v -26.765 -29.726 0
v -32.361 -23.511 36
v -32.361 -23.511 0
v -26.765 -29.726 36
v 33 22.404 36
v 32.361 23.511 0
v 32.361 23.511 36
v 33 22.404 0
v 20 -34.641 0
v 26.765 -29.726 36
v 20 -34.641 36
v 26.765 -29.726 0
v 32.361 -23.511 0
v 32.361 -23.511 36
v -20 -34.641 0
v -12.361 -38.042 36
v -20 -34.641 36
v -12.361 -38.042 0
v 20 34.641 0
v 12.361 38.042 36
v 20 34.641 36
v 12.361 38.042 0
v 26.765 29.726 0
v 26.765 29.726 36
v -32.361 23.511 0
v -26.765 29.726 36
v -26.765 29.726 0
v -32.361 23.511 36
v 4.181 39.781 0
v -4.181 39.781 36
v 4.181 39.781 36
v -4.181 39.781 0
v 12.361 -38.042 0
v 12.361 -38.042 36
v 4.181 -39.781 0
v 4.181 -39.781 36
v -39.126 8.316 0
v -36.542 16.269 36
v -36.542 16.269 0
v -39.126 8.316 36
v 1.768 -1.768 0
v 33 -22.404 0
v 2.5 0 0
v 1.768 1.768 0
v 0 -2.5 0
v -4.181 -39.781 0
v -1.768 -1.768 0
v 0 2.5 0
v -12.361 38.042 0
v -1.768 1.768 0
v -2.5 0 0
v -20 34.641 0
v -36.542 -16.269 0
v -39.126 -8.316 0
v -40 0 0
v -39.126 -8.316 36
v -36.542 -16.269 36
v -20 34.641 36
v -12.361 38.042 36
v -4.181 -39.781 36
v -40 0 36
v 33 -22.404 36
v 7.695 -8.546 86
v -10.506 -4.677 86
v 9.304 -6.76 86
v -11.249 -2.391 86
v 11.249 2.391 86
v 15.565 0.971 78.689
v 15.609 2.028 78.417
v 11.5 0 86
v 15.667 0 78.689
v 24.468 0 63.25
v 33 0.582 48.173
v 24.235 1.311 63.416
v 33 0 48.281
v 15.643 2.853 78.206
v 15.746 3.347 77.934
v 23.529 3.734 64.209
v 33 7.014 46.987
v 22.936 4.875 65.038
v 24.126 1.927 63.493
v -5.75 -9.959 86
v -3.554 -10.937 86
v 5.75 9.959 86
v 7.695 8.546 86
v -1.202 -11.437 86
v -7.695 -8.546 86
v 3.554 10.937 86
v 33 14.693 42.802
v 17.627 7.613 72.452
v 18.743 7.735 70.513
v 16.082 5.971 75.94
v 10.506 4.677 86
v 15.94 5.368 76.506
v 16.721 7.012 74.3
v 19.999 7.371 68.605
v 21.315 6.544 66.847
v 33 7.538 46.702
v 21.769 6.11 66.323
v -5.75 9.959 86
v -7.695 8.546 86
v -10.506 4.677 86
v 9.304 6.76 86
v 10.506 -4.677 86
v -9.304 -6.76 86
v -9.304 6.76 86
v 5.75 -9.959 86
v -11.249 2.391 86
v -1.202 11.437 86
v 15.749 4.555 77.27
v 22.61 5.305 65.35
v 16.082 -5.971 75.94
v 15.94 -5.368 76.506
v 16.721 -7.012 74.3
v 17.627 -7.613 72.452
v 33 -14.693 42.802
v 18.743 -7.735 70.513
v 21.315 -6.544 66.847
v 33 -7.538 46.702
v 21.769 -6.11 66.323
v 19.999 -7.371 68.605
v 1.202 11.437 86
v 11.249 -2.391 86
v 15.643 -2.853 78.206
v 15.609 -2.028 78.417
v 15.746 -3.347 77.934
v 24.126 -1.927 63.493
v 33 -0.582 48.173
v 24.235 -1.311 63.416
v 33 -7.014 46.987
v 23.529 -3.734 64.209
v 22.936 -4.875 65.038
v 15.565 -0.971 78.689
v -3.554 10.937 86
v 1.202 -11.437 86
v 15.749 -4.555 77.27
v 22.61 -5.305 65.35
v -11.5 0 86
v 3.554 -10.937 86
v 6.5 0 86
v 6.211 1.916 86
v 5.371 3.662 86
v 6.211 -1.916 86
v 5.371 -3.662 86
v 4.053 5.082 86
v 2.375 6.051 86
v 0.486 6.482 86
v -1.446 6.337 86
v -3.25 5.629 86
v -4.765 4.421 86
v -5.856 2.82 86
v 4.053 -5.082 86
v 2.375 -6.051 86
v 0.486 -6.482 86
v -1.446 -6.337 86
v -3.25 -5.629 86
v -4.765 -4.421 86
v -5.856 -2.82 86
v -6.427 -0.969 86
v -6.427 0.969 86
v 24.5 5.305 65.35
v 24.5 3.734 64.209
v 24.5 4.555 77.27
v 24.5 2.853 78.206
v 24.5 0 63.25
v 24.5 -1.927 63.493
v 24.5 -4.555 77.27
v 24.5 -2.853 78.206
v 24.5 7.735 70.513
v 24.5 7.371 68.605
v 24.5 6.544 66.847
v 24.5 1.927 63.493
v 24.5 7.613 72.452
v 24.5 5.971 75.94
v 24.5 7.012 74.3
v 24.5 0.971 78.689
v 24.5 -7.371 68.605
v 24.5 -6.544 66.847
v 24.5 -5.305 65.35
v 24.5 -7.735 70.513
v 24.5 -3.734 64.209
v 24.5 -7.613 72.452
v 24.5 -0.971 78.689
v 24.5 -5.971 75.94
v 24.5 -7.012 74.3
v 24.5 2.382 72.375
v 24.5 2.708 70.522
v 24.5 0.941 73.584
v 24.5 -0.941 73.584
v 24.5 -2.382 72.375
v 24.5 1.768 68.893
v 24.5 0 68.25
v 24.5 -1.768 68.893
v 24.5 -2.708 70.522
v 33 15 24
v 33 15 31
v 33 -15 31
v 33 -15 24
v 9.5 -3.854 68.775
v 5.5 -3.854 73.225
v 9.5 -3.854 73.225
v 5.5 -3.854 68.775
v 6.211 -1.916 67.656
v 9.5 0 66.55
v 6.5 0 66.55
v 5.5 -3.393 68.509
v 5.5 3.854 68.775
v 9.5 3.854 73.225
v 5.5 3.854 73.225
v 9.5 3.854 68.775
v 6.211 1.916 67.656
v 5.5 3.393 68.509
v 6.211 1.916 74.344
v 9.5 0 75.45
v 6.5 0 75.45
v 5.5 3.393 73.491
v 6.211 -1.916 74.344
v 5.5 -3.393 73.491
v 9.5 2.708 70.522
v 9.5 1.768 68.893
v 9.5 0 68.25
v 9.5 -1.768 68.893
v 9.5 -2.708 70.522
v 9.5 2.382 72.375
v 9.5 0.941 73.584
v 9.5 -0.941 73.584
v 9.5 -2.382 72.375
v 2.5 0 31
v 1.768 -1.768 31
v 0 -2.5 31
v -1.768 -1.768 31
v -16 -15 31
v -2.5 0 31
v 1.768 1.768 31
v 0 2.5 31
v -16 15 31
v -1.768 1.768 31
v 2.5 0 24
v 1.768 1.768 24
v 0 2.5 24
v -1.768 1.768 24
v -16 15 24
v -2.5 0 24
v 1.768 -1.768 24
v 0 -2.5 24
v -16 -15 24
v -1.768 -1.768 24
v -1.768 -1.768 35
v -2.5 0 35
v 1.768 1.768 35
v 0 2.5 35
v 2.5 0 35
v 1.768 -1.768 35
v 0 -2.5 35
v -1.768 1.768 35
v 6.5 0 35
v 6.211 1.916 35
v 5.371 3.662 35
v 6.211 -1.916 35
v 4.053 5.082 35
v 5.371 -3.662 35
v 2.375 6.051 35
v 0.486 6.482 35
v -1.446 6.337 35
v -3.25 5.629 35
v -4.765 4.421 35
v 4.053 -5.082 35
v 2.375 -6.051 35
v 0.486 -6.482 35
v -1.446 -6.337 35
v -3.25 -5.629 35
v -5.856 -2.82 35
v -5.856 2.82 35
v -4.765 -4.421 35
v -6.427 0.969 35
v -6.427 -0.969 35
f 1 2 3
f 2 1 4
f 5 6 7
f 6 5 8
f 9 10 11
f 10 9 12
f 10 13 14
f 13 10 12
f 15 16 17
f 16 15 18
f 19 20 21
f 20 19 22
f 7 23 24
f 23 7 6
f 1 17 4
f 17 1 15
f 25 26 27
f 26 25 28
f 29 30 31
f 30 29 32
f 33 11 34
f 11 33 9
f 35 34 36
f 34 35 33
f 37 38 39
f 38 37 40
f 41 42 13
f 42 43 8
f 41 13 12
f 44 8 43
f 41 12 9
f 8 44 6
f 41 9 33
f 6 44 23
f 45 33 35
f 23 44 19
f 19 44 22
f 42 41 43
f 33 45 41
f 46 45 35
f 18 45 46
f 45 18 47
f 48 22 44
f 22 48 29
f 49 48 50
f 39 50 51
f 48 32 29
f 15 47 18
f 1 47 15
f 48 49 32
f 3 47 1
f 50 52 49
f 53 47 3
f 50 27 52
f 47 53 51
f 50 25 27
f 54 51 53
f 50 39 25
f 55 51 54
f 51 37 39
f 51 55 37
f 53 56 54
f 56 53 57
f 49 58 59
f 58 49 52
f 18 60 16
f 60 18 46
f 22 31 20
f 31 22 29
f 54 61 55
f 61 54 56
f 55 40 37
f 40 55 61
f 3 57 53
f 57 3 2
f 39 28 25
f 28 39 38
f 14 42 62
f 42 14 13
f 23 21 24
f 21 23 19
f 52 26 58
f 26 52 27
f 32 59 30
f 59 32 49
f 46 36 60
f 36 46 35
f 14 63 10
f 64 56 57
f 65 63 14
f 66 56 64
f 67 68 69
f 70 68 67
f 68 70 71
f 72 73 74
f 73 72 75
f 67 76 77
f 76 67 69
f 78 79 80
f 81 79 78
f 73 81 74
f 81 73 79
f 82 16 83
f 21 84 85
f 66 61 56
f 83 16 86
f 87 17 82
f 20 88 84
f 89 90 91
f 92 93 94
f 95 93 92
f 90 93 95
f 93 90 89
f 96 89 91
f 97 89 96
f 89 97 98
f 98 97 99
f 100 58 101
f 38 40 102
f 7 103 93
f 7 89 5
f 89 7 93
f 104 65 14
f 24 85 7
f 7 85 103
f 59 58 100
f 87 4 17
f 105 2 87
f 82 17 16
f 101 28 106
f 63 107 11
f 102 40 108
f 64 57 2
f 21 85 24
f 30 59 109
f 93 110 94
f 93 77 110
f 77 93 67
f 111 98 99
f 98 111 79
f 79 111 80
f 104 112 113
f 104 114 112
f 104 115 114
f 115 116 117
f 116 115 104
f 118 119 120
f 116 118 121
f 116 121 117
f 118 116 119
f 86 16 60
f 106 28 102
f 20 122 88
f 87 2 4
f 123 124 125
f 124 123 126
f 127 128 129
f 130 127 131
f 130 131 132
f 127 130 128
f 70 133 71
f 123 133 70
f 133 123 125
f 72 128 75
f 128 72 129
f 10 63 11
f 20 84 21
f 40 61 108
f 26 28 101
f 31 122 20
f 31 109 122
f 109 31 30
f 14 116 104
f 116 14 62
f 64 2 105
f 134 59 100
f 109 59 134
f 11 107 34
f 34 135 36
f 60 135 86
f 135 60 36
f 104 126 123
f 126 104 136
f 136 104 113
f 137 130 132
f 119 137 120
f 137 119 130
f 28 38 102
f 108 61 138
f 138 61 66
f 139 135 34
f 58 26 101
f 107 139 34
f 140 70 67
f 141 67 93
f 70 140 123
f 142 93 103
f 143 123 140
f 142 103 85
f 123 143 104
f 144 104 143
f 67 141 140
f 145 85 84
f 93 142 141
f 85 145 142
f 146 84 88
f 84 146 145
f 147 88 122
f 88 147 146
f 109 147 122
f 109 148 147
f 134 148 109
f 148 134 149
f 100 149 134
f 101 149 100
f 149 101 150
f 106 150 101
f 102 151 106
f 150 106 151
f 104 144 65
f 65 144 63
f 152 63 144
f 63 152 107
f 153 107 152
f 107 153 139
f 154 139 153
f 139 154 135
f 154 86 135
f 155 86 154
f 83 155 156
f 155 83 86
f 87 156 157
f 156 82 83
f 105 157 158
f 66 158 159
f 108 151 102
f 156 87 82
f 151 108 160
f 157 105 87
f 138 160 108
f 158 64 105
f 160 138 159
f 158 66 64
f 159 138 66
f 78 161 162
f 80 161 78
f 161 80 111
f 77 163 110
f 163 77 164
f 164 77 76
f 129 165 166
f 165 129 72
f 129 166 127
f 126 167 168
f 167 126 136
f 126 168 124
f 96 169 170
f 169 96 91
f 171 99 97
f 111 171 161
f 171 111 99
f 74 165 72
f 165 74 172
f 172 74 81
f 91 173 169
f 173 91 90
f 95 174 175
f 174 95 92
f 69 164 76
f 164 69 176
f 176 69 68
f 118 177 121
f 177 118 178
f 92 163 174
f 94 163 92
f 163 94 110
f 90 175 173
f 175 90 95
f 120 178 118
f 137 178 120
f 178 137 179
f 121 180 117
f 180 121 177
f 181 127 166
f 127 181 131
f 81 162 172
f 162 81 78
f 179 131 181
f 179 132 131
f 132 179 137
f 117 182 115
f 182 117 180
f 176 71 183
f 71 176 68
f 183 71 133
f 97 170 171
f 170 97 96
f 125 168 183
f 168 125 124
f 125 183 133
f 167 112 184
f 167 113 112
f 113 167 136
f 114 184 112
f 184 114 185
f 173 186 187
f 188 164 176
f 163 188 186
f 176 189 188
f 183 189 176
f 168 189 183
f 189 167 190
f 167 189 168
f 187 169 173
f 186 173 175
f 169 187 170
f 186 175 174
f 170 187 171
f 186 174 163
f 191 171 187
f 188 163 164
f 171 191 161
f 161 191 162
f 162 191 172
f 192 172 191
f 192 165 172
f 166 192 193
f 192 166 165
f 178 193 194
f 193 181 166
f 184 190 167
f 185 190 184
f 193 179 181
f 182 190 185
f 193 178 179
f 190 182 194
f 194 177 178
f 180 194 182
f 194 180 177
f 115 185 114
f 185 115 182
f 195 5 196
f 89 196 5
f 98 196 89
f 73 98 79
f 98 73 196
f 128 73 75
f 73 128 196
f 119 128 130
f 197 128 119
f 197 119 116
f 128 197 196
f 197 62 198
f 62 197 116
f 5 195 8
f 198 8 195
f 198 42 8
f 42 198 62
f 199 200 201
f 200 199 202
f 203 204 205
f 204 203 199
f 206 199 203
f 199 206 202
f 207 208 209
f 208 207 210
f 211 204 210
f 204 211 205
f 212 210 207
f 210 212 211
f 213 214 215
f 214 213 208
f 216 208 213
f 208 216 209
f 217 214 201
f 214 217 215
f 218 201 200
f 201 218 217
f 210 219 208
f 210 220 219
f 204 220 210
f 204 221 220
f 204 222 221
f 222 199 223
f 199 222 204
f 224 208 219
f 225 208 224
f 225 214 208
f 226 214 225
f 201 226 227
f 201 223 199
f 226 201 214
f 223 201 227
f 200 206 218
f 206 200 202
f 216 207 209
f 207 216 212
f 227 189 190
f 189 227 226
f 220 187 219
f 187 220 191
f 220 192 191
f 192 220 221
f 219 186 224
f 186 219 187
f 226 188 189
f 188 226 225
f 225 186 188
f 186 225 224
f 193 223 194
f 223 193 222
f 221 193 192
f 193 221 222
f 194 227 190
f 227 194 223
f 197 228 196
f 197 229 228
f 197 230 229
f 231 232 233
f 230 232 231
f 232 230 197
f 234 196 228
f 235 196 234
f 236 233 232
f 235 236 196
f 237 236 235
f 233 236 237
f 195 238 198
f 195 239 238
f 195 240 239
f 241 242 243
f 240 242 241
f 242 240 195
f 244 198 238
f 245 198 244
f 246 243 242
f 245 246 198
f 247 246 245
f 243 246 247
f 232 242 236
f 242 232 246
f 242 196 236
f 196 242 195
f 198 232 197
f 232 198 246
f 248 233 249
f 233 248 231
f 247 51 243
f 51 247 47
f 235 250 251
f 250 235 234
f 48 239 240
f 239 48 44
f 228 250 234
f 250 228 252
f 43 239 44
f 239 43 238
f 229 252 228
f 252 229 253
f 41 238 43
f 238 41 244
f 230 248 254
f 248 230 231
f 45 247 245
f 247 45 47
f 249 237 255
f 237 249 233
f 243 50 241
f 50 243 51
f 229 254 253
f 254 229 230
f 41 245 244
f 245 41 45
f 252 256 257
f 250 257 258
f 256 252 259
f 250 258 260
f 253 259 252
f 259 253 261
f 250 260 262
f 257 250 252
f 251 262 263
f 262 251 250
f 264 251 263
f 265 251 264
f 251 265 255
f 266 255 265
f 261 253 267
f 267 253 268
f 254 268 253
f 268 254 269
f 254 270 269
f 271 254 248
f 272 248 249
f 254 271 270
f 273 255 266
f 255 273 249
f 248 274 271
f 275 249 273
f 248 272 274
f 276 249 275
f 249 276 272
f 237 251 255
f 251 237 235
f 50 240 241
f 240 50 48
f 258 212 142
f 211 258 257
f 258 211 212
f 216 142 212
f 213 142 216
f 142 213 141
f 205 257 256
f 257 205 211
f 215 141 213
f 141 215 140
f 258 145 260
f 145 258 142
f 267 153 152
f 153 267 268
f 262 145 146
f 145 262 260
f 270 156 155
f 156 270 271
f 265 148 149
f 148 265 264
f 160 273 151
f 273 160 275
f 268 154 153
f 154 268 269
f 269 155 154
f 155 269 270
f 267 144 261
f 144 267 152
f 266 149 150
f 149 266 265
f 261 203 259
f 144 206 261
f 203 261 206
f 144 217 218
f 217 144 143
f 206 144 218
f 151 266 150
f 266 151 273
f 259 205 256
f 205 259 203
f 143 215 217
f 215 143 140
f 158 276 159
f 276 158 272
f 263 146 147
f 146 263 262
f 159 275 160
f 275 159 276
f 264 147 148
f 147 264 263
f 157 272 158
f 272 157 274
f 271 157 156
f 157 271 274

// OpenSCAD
// Drzak lampy - lupy -- nabytek ma presah na konci policky
// Lamp holder -- furniture has .... 
// vyska zkoseni
vkonus=50;
// vyska dolni casti - musi byt aspon v2haku + vhaku + stena
vbottom=36;
// prumer dolni casti
dholder = 80;
// prumer diry v drzaku
dlamp = 13;
// tloustka steny 
stena = 5;
// seriznuti bloku z dholder/2 na 
seriznuti = 33;
// tloustka haku 
vhaku = 7;
// sirka haku
mhaku = 30;
// prumer sroubku v haku
dsroubek = 5;
// posuv haku proti zakladne
v2haku = 24;
// drzak sroubu pro utazeni - 10mm pod vrcholem
vuta = (vbottom + vkonus - 10);
// prumer sroubu pro utazeni
duta = 5.5;
// matice M5 ma vnejsi prumer 8.8
dmuta = 8.9;
// delka zavitu
luta = 18;
// kontrola vbottom proti posuvu haku 
vbmin = v2haku + vhaku + stena;
if ( vbmin > vbottom) { 
    echo ("vbottom ma byt vetsi nez vbmin: vbottom = ", vbottom, ";vbmin=", vbmin );
    } 
color("red") {
  difference() {  
   difference() {
     union() {
         cylinder(h=vbottom, d=dholder); // dolni valec
         translate([0,0,vbottom]) {
           cylinder(h=vkonus, d1=dholder, d2=(dlamp + 2*stena)); 
         }; // zkosena cast
         // drzak sroubu pro utazeni
         translate([dlamp/2,0,(vuta-stena)])
               rotate([0,90,0]) cylinder( h = luta, d = (duta+2*stena));
     } // zakladni blok
     translate([seriznuti,-seriznuti,-1]) 
            cube([seriznuti,2*seriznuti, (vbottom + vkonus/2)]);
   }; // zaklad se seriznutym blokem  
  union () {
    // dira pro hak
    translate([-(mhaku/2)-1,-(mhaku/2), v2haku])
      cube([seriznuti+mhaku/2+2, mhaku, vhaku]);
    // dira pro sroubek    
    translate([0,0,-1]) cylinder(h = vbottom, d = dsroubek);
    // dira pro zasazeni lampy  
    translate([0,0,vbottom-1]) cylinder(h = vkonus+2, d = dlamp);  
    // dira pro sroubek a maticku pro utazeni zasazeni  
    translate([dlamp/2-1,0,(vuta-stena)])
            rotate([0,90,0]) 
              union () {
                  cylinder(h=4, d=dmuta, $fn = 6);
                  cylinder(h=luta+2, d=duta);  
              } 
    }   
 } // vyriznuty otvor pro hak a sroubek
}
